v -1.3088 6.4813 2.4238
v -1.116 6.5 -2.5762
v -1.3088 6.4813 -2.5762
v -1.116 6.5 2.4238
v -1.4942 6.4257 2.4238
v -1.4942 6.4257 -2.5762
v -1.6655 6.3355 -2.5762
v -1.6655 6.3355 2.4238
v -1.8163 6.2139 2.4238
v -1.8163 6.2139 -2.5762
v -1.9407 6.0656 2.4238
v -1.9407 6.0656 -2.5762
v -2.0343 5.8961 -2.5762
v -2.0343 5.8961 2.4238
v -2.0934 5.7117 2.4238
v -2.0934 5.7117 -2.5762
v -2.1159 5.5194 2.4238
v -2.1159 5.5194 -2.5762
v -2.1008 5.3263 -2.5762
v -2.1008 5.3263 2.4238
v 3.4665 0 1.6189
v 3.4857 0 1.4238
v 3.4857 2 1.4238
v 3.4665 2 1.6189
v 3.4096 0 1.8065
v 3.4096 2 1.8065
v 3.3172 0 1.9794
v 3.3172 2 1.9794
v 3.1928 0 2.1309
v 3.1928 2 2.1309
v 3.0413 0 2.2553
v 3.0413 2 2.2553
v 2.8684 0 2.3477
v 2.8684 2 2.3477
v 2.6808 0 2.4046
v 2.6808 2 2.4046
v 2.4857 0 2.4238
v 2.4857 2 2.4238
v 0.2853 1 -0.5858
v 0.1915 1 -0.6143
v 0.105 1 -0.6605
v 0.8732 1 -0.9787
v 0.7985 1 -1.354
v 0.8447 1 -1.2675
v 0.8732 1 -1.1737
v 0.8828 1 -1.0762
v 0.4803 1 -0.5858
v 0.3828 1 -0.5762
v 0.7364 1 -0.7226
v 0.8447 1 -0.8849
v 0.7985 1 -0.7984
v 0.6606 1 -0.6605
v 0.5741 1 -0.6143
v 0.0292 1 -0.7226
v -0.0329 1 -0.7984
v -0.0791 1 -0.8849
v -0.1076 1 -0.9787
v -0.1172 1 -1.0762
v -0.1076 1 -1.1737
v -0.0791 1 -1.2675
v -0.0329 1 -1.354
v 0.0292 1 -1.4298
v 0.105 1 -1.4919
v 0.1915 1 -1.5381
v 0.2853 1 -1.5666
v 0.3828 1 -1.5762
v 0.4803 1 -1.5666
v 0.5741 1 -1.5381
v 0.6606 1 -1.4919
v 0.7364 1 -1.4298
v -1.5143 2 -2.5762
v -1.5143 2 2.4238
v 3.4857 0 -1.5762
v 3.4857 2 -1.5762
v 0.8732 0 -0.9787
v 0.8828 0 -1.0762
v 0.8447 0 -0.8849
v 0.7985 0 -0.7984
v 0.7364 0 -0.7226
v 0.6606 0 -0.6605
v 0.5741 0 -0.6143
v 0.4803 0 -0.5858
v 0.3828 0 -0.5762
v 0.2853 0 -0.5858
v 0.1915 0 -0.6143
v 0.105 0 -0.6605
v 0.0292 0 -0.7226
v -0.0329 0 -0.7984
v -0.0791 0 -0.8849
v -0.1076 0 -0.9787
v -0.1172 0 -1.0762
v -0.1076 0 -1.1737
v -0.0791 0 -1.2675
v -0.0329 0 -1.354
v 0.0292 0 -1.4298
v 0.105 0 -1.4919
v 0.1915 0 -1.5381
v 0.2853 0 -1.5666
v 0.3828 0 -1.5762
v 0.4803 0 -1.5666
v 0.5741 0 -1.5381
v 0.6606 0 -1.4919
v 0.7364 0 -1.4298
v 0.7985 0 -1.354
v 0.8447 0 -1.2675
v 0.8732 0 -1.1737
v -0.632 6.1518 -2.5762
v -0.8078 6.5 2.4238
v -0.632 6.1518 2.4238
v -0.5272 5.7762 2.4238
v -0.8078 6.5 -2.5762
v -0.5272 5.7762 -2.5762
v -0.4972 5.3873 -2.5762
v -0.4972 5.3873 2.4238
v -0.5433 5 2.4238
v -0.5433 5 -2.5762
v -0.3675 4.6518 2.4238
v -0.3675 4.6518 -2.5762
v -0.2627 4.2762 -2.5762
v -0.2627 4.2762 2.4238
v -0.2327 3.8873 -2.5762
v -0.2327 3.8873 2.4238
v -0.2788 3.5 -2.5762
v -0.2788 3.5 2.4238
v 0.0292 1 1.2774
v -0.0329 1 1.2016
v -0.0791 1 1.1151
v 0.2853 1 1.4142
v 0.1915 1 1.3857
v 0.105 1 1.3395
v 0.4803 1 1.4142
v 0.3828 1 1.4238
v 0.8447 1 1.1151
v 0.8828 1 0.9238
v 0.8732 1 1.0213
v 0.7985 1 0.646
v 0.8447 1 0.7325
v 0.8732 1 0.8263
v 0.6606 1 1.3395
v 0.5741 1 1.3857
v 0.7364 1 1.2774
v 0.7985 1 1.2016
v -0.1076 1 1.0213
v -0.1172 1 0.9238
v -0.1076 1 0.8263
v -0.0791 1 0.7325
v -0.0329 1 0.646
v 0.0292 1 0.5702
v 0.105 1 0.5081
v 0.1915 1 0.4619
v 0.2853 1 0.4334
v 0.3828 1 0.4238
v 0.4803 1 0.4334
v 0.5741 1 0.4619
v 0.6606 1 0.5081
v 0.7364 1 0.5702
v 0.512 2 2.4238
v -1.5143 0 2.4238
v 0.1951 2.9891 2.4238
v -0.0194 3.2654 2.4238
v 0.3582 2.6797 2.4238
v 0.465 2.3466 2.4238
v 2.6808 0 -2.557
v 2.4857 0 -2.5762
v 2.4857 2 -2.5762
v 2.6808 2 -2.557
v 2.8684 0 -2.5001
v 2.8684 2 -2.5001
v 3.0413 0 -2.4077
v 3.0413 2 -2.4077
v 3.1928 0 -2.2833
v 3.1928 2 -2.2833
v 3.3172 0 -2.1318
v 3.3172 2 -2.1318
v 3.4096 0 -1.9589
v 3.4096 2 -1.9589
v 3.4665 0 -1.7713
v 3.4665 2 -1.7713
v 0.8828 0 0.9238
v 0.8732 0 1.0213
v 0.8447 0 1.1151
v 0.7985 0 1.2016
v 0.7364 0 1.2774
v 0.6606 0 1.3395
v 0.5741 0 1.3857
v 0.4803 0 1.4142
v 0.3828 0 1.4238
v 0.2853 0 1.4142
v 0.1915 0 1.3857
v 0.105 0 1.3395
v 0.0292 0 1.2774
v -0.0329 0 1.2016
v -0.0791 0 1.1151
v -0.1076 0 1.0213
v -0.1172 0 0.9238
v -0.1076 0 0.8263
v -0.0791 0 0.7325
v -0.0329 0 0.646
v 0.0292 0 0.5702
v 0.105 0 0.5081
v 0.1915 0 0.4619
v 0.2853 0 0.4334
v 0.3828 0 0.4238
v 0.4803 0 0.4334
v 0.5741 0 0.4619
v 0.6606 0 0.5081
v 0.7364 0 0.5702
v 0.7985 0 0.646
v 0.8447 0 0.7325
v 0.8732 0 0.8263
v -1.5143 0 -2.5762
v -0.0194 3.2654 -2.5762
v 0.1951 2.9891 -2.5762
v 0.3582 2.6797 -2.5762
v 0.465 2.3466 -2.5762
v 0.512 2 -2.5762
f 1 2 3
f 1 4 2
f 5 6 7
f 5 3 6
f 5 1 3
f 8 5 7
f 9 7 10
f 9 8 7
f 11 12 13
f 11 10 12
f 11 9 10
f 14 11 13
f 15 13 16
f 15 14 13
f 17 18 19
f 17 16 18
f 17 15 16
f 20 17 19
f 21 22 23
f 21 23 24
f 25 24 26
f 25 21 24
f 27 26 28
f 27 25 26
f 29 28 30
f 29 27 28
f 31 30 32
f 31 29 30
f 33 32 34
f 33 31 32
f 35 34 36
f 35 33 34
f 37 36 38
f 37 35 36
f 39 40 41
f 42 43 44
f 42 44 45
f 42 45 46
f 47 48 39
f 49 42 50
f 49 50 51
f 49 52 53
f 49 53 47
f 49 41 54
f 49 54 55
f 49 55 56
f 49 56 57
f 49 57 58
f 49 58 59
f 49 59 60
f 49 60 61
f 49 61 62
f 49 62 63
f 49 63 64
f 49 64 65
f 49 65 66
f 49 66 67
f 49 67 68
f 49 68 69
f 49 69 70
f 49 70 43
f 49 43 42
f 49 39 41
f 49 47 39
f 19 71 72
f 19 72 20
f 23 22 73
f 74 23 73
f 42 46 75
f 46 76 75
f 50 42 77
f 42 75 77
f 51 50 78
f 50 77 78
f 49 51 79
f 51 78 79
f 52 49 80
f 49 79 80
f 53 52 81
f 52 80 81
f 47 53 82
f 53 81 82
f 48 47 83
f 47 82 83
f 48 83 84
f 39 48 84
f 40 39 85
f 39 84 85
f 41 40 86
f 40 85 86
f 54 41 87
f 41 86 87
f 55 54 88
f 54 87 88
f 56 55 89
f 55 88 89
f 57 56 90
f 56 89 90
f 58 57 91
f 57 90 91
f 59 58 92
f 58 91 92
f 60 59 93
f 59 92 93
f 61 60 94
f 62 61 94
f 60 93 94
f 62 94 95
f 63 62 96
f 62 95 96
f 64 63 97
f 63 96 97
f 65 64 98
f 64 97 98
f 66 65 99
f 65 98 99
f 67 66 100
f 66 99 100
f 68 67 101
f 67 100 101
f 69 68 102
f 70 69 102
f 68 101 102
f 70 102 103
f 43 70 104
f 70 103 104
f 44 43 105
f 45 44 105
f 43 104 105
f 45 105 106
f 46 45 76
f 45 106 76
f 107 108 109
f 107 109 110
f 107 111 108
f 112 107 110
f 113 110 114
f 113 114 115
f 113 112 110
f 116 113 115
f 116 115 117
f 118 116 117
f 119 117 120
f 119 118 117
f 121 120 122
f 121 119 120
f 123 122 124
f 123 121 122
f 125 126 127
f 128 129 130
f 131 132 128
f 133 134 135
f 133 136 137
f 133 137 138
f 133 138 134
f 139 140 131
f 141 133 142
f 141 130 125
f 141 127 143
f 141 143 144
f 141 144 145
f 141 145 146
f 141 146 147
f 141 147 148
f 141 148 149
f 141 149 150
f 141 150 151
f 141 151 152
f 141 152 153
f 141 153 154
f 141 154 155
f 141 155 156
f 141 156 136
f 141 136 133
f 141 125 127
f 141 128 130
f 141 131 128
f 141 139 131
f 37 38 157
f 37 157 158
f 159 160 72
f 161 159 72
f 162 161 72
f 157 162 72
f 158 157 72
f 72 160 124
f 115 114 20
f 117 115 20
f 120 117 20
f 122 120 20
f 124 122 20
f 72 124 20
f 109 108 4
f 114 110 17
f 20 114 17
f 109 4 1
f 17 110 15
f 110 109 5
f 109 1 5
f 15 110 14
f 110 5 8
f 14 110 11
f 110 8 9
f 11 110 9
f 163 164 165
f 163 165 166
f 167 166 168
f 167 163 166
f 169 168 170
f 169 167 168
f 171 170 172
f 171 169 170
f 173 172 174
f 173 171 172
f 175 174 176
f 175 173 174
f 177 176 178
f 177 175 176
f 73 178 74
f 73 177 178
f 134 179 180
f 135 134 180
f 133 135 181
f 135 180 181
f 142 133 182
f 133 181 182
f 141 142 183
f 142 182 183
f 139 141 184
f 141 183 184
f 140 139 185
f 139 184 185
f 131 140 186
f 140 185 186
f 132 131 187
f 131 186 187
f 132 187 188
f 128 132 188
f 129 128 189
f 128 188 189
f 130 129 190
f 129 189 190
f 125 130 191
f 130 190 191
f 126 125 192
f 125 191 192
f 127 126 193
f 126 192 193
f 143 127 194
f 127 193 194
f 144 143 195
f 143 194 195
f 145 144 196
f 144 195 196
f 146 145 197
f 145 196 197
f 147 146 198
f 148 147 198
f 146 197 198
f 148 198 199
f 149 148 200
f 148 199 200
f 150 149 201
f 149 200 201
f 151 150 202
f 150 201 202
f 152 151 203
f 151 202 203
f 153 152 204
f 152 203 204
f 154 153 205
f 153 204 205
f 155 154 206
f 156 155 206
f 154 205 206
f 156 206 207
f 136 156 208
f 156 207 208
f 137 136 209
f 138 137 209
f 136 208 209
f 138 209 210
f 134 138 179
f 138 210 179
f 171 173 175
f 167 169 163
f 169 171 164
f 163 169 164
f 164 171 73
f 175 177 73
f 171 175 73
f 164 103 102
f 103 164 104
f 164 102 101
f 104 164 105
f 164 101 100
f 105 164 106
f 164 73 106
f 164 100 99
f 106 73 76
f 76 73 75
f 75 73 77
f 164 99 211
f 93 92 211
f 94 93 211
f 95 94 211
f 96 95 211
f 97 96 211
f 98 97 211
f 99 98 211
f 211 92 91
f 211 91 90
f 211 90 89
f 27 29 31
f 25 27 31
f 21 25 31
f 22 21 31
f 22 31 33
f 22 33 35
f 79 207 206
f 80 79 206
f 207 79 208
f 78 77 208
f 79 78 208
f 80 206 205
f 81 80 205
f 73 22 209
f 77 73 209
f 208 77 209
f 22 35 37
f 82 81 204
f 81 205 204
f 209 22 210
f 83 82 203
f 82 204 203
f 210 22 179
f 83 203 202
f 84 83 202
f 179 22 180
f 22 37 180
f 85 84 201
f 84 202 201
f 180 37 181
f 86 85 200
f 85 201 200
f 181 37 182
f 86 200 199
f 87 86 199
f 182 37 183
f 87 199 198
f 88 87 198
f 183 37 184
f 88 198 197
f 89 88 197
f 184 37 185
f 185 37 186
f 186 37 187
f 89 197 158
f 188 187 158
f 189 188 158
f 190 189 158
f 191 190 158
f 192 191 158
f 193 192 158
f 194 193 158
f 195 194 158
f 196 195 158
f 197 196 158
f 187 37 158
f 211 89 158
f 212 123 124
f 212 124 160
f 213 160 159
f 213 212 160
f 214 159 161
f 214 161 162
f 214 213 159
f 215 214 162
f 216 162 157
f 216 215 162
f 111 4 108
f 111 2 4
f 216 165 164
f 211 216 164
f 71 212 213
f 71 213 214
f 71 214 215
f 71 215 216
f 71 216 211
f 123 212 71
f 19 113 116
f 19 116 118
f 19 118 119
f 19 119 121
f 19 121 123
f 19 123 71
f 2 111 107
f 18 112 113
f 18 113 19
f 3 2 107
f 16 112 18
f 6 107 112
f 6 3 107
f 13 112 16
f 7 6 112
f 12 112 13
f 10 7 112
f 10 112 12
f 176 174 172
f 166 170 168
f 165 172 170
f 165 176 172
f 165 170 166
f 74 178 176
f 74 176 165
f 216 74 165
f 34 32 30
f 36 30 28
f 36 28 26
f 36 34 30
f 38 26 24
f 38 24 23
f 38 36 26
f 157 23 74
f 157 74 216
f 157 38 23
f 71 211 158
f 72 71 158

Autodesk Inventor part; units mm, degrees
ref_plane "YZ Plane" through (0, 0, 0) normal (1, 0, 0) x (0, 1, 0)
ref_plane "XZ Plane" through (0, 0, 0) normal (0, 1, 0) x (-1, 0, 0)
ref_plane "XY Plane" through (0, 0, 0) normal (0, 0, 1) x (1, 0, 0)
sketch "Szkic1" plane through (0, 0, 0) normal (0, 1, 0) x (-1, 0, 0)
  line L0 (-2.4857, -2.5762) -> (1.5143, -2.5762)
  line L1 (1.5143, -2.5762) -> (1.5143, 2.4238)
  line L2 (1.5143, 2.4238) -> (-2.4857, 2.4238)
  line L3 (-3.4857, 1.4238) -> (-3.4857, -1.5762)
  arc A0 (-2.4857, 2.4238) -> (-3.4857, 1.4238) centre (-2.4857, 1.4238) ccw
  arc A1 (-3.4857, -1.5762) -> (-2.4857, -2.5762) centre (-2.4857, -1.5762) ccw
  point P0 (0, 0)
  point P1 (-3.4857, 2.4238)
  dimension "d0" = 5
  dimension "d1" = 5
  dimension "d2" = 1
extrude "Wyciągnięcie proste1" add sketch "Szkic1" along normal blind 2
sketch "Szkic2" plane through (0, 0, 0) normal (0, -1, 0) x (1, 0, 0)
  circle A0 centre (0.3828, -1.0762) radius 0.5
  circle A1 centre (0.3828, 0.9238) radius 0.5
  line L0 (2.4857, -2.5762) -> (-1.5143, -2.5762) projected
  line L1 (-1.5143, 2.4238) -> (2.4857, 2.4238) projected
  point P0 (0, 0)
  dimension "d5" = 1
  dimension "d6" = 1
  dimension "d7" = 2
  dimension "d8" = 1
  dimension "d9" = 1.5
  dimension "d10" = 1.5
extrude "Wyciągnięcie proste2" cut sketch "Szkic2" against normal blind 1
sketch "Szkic3" plane through (2.4857, 0, -2.5762) normal (0, 0, -1) x (-1, 0, 0)
  line L0 (0, 2) -> (4, 2) projected
  line L1 (4, 2) -> (4.2645, 3.5)
  line L2 (4.2645, 3.5) -> (2.7645, 3.5)
  line L3 (1.9737, 2) -> (4, 2)
  arc A0 (2.7645, 3.5) -> (1.9737, 2) centre (3.9714, 1.9052) ccw
  line L4 (4, 2) -> (4.7935, 6.5)
  line L5 (4.529, 5) -> (3.029, 5)
  arc A1 (3.029, 5) -> (2.7645, 3.5) centre (4.718, 3.9289) ccw
  line L6 (4.7935, 6.5) -> (3.2935, 6.5)
  arc A2 (3.2935, 6.5) -> (3.029, 5) centre (4.9825, 5.4289) ccw
  point P0 (2.4857, 0)
  point P1 (2, 2)
  point P2 (1.9737, 2)
  point P3 (3.5145, 3.5)
  dimension "d15" = 100
  dimension "d16" = 1.5
  dimension "d17" = 2
  dimension "d18" = 0
  dimension "d24" = 1.5
  dimension "d28" = 1.5
  dimension "d29" = 100
  dimension "d30" = 1.5
  dimension "d31" = 2
  dimension "d32" = 1.5
  dimension "d33" = 1.5
  dimension "d34" = 2
extrude "Wyciągnięcie proste3" add sketch "Szkic3" against normal blind 5 contours A0 L2 L1 L0
extrude "Wyciągnięcie proste4" add sketch "Szkic3" against normal blind 5 contours A1 L5 L4 L2 | A2 L6 L4 L5
fillet "Zaokrąglenie1" radius 1 1 edges at (-2.3078, 6.5, -0.0762)
properties part number "fotel" material "Tworzywo sztuczne ABS"
